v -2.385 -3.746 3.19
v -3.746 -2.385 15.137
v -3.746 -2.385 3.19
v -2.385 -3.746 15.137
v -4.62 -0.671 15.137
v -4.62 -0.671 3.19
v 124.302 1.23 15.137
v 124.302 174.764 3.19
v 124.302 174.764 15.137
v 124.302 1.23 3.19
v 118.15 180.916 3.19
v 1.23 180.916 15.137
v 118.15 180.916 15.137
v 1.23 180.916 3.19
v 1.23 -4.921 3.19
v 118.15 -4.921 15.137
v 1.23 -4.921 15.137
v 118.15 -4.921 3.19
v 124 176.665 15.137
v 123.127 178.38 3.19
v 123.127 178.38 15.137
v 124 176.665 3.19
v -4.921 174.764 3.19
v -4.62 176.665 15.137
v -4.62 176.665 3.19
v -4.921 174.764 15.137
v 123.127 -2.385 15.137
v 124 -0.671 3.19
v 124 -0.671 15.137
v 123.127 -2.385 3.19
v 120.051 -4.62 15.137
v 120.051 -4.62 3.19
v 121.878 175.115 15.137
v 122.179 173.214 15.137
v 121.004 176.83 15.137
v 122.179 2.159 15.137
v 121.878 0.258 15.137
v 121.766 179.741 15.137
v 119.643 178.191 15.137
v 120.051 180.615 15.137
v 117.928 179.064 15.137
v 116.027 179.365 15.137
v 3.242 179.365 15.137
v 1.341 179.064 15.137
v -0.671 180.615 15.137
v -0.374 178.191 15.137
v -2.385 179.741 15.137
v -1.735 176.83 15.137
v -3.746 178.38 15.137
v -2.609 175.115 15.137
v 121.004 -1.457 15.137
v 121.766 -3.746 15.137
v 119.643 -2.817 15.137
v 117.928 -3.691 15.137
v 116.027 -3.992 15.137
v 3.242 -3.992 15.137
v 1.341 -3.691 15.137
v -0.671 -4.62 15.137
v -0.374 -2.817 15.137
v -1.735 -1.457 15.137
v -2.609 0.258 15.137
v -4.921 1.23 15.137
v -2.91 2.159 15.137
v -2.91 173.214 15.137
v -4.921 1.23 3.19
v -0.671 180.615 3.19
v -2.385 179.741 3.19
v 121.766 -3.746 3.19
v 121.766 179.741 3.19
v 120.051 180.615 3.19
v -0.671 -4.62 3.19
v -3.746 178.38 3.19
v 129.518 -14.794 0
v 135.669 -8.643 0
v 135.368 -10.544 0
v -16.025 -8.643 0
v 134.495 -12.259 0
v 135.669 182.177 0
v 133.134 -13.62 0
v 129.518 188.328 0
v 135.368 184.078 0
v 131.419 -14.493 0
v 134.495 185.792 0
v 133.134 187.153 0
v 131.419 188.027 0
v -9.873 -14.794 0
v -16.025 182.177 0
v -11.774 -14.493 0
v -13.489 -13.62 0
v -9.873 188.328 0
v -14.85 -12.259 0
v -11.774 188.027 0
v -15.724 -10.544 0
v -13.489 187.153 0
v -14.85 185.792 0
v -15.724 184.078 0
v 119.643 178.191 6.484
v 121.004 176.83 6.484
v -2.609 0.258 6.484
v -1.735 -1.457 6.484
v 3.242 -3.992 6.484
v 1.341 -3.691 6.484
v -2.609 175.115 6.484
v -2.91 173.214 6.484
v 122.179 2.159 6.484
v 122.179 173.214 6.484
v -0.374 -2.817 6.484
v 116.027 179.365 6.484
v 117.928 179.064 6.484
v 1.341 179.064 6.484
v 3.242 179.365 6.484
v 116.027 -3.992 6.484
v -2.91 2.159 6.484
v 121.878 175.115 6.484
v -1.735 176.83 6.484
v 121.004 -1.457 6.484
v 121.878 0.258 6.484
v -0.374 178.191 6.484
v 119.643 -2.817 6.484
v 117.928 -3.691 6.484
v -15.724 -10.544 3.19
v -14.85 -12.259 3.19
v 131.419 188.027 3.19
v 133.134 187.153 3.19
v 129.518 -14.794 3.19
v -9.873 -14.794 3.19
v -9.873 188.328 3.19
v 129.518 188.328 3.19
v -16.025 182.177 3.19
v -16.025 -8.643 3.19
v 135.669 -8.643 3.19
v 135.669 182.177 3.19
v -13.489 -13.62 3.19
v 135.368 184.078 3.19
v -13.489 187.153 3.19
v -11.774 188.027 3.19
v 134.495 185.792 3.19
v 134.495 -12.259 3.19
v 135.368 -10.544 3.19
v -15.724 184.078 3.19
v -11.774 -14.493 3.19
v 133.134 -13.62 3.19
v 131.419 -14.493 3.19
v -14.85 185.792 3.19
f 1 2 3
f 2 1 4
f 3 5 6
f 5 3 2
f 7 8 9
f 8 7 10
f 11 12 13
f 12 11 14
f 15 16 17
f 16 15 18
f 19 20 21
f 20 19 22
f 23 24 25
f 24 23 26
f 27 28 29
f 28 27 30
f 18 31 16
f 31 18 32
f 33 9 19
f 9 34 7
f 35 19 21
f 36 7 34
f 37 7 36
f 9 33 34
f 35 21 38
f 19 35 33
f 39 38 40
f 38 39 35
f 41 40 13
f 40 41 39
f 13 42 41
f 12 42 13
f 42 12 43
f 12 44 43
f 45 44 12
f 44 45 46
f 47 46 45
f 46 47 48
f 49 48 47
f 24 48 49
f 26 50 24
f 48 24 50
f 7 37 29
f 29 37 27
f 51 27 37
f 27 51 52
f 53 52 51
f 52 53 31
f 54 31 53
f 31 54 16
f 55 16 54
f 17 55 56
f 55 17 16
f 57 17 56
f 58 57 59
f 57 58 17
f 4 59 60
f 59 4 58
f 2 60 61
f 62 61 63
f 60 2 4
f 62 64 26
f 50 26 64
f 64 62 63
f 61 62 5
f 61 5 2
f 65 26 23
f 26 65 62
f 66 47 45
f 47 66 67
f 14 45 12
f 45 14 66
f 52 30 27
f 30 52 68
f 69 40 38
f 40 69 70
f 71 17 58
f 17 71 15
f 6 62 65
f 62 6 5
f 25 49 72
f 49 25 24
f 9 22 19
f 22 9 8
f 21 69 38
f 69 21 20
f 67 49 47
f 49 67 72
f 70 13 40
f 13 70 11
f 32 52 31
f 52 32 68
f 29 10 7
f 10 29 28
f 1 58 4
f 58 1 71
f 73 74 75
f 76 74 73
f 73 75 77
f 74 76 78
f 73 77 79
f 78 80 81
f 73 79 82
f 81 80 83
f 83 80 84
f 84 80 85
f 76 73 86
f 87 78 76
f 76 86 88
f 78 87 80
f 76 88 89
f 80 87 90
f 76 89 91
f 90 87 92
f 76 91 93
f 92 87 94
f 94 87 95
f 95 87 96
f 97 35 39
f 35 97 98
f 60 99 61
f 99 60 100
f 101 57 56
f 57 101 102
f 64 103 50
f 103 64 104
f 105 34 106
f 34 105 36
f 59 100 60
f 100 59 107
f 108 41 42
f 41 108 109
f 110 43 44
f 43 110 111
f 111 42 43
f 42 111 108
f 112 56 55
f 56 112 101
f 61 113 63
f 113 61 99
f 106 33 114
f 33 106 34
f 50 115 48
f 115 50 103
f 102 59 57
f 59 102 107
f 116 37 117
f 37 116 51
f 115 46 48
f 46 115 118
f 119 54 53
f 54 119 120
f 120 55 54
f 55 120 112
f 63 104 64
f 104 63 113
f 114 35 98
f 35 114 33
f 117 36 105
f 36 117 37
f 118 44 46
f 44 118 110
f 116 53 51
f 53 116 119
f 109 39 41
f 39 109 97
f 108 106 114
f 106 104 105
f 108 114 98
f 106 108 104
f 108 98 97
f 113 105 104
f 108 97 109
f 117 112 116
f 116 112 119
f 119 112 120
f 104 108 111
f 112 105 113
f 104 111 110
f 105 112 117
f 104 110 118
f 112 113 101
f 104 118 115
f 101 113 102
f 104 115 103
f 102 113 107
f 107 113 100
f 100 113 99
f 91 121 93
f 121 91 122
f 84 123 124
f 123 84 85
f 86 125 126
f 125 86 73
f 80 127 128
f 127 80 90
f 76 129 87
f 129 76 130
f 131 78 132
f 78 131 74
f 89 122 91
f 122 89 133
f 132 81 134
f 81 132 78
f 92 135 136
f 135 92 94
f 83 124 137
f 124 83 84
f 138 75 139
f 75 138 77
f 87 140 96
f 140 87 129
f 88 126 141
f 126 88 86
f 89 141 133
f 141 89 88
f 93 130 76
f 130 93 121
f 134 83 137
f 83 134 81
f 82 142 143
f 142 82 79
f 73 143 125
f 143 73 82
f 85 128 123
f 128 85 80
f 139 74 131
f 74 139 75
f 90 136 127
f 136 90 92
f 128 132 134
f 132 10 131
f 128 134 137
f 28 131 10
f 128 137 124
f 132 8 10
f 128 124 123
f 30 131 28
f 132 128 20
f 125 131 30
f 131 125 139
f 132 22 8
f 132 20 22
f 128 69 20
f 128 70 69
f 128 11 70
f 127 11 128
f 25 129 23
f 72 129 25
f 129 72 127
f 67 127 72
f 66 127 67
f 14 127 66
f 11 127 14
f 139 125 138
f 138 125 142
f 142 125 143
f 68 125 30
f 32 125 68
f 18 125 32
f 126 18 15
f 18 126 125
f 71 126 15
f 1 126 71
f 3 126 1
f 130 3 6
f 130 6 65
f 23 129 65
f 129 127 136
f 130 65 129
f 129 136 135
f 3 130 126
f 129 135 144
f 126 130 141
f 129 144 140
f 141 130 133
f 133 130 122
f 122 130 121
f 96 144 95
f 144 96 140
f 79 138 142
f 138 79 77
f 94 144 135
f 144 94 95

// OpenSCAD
//note, change interior translation parameter when changing sizefactor -- image centered on the corner.  Just changing sizefactor will shift it slightly leaving uneven thicknesses.
sizefactor = 0.61515;

//all the numbers below are in mm, including translations.  Original intent was length of 13 in (330.2mm).  Unable to find printer with table that large.  Sizefactor shrinks to 8 inches.
//note:  OK to shrink the flange/base (largest rectangle) individually if needed for slight changes to fit printer table.
//Currently nlength (330.2mm) * sizefactor (0.61515) = 203.123mm (7.997in).
//Currently nwidth (189.69mm) * sizefactor (0/61515) = 116.688mm (4.595in).


    {   //flange/base
        nlength = 330.20 * sizefactor;
        nwidth= 189.69 * sizefactor * 1.30;
        nheight = 5.17 * sizefactor;
        nradius = 10 * sizefactor;
        ndRadius = 2*nradius;


        translate([-16.05*sizefactor, -14.05*sizefactor, 0*sizefactor]) {
            minkowski() {
                cube(size=[nwidth-ndRadius,nlength-ndRadius,        nheight]);
                cylinder(r=nradius, h=0.01);
            }
        }
    }


difference() {
    {   //outer rim (inserts into headliner)
        length = 302.10 * sizefactor;
        width= 161.59 * sizefactor * 1.30;
        height = 24.59 * sizefactor;
        radius = 10 * sizefactor;
        dRadius = 2*radius;

        translate([2*sizefactor, 2*sizefactor, 0*sizefactor]) {
            minkowski() {
                cube(size=[width-dRadius,length-dRadius, height]);
                cylinder(r=radius, h=0.01);
            }
        }   
    };

       

     {  //interior (to remove)
        ilength = 298.07 * sizefactor;
        iwidth= 154.05 * sizefactor * 1.32;
        iheight = 26.59 * sizefactor;
        iradius = 10 * sizefactor;
        idRadius = 2*iradius;
        translate([5.27*sizefactor, 3.51*sizefactor, 10.54*sizefactor]){
            minkowski() {
                cube(size=[iwidth-idRadius,ilength-idRadius,        iheight]);
                cylinder(r=iradius, h=0.01);
            }
        }
    };
}
   
